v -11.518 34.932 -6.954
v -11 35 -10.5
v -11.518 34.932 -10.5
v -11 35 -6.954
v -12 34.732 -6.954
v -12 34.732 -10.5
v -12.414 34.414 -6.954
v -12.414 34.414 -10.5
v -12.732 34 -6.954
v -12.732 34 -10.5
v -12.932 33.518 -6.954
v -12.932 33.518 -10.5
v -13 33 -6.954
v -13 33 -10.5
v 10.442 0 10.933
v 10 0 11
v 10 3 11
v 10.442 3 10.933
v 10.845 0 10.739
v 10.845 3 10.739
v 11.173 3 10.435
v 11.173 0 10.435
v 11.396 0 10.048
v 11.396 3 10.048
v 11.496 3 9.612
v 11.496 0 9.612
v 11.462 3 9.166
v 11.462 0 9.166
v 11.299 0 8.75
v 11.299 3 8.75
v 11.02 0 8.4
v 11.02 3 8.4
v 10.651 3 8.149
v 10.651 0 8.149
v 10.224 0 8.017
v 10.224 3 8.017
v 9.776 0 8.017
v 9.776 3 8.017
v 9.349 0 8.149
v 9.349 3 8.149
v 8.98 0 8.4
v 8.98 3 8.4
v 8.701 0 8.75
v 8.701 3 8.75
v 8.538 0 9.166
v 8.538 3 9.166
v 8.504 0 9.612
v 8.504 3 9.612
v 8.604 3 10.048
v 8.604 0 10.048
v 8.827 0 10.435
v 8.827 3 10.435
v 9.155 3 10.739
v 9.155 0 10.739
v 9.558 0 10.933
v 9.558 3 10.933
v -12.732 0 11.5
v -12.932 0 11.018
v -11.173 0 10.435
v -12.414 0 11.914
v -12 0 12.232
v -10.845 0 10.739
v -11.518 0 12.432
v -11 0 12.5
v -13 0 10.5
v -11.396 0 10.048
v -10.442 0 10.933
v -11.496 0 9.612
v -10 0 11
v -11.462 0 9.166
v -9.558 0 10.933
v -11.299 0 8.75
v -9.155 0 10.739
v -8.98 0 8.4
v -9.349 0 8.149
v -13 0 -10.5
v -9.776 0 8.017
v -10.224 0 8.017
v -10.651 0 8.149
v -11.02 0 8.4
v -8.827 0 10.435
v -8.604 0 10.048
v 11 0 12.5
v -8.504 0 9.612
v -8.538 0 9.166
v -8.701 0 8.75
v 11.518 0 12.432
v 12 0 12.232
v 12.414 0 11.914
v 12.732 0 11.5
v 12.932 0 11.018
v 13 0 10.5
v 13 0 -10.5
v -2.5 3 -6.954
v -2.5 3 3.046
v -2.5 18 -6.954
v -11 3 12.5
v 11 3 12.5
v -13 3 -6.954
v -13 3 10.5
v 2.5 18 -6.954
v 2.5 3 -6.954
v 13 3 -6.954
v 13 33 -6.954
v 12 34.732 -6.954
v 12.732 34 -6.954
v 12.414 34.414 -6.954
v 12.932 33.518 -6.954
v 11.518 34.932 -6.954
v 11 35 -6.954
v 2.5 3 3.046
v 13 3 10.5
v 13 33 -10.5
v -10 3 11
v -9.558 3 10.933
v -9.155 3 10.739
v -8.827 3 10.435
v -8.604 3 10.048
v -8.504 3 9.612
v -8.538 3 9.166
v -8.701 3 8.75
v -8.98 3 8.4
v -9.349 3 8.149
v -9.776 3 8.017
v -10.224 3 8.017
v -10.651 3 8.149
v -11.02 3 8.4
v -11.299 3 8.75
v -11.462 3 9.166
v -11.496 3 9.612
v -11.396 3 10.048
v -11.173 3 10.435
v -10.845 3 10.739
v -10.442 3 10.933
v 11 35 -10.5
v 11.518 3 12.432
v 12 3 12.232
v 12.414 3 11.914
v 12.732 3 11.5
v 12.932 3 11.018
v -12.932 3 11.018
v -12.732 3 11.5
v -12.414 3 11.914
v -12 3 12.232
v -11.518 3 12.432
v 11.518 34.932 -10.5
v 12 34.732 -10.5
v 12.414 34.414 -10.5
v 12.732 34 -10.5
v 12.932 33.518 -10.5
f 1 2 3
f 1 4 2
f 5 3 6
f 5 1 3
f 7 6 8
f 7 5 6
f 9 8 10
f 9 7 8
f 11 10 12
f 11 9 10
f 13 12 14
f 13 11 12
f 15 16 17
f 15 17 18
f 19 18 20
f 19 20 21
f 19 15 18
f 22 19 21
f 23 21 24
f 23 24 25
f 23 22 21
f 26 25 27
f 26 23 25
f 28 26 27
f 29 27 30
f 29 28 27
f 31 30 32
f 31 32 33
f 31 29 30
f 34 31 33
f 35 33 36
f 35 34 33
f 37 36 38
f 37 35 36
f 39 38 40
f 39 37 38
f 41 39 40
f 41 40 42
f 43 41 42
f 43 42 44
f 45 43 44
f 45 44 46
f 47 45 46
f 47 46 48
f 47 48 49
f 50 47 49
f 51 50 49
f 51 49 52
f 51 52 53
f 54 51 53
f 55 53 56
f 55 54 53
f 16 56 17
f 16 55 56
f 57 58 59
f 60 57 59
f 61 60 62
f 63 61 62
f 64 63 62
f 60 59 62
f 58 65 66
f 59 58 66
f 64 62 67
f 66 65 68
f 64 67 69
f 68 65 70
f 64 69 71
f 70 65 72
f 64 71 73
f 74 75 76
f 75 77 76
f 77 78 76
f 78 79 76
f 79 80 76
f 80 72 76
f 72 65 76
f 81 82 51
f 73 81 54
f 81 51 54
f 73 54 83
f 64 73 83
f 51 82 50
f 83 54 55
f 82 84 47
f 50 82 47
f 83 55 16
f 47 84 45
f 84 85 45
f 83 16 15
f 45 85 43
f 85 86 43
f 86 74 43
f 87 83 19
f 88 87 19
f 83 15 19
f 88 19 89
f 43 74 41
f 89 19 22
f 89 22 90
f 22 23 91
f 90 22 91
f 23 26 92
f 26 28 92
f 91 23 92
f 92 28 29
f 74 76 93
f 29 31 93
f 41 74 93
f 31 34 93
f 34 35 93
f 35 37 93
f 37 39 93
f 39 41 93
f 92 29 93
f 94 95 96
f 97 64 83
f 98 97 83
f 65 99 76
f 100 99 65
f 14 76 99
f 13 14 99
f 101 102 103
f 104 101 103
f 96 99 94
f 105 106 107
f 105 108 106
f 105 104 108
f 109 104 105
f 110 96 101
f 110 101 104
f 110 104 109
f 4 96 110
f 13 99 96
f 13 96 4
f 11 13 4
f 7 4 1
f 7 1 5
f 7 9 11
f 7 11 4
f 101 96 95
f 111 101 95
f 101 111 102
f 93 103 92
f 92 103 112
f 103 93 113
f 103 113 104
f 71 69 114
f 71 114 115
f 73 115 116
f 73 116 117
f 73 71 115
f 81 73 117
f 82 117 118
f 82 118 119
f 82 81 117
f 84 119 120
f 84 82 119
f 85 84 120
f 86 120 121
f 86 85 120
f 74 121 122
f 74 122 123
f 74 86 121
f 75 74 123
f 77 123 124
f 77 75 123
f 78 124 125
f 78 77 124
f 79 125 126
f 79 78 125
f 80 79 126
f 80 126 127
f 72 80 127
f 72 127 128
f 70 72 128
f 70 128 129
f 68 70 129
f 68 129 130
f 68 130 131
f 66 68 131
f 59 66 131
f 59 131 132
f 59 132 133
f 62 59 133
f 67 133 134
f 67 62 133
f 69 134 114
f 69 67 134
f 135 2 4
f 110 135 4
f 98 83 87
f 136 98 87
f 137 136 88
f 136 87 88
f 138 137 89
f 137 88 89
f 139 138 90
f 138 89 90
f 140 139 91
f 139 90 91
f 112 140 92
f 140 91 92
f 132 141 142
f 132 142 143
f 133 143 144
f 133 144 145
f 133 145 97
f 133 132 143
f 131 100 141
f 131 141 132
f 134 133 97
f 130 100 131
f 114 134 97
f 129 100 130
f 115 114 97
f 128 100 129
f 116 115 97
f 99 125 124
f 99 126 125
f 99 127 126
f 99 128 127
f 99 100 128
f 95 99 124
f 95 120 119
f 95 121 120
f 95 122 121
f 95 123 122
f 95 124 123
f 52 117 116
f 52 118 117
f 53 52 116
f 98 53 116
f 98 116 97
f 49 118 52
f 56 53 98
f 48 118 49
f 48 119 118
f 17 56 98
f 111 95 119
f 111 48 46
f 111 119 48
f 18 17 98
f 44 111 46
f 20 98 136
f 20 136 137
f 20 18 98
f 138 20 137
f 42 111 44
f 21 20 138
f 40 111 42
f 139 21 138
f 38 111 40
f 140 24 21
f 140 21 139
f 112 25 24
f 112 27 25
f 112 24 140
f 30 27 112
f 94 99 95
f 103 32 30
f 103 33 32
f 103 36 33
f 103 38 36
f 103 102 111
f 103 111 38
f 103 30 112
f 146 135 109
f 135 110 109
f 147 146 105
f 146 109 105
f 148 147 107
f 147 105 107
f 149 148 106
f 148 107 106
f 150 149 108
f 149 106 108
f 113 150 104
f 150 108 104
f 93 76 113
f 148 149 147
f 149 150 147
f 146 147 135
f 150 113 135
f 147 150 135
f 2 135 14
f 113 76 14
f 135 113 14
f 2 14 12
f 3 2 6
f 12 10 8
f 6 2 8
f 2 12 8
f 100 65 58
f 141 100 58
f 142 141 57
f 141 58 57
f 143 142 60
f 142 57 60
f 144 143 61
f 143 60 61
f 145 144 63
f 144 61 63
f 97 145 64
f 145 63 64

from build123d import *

# Parameters (mm, degrees)
SKETCH1_R           = 1.5
BOSS_EXTRUDE1_DEPTH = 3
SKETCH2_W           = 3.546458452
SKETCH2_H           = 32
BOSS_EXTRUDE2_DEPTH = 26
BOSS_EXTRUDE3_START = -10.5
BOSS_EXTRUDE3_DEPTH = 5
FILLET1_R           = 2
FILLET2_R           = 2


with BuildPart() as part:
    # Sketch1 → Boss-Extrude1 (new body)
    with BuildSketch(Plane(origin=(0, 0, 0), x_dir=(1, 0, 0), z_dir=(0, 1, 0))):
        with BuildLine():
            Line((13, 10.5), (-13, 10.5))
            Line((-13, 10.5), (-13, -10.5))
            ThreePointArc((-13, -10.5), (-12.414213562, -11.914213562), (-11, -12.5))
            Line((-11, -12.5), (11, -12.5))
            ThreePointArc((11, -12.5), (12.414213562, -11.914213562), (13, -10.5))
            Line((13, -10.5), (13, 10.5))
        make_face()
        with Locations(Location((-10, -9.5, 0), (0, 0, 270))):
            Circle(SKETCH1_R, mode=Mode.SUBTRACT)
        with Locations(Location((10, -9.5, 0), (0, 0, 270))):
            Circle(SKETCH1_R, mode=Mode.SUBTRACT)
    extrude(amount=BOSS_EXTRUDE1_DEPTH)

    # Sketch2 → Boss-Extrude2 (add)
    with BuildSketch(Plane.ZY.offset(13)):
        with Locations((-8.726770774, 19)):
            Rectangle(SKETCH2_W, SKETCH2_H)
    extrude(amount=-BOSS_EXTRUDE2_DEPTH)

    # Sketch3 → Boss-Extrude3 (add)
    with BuildSketch(Plane.ZY.offset(13).offset(BOSS_EXTRUDE3_START)):
        Polygon((-6.953541548, 18), (3.046458452, 3), (-6.953541548, 3), align=None)
    extrude(amount=-BOSS_EXTRUDE3_DEPTH)

    # Fillet1
    fillet1_edges = [part.edges().sort_by_distance(p)[0] for p in [
        (-13, 35, -8.726770774),
    ]]
    fillet(fillet1_edges, radius=FILLET1_R)

    # Fillet2
    fillet2_edges = [part.edges().sort_by_distance(p)[0] for p in [
        (13, 35, -8.726770774),
    ]]
    fillet(fillet2_edges, radius=FILLET2_R)


solid = part.part
